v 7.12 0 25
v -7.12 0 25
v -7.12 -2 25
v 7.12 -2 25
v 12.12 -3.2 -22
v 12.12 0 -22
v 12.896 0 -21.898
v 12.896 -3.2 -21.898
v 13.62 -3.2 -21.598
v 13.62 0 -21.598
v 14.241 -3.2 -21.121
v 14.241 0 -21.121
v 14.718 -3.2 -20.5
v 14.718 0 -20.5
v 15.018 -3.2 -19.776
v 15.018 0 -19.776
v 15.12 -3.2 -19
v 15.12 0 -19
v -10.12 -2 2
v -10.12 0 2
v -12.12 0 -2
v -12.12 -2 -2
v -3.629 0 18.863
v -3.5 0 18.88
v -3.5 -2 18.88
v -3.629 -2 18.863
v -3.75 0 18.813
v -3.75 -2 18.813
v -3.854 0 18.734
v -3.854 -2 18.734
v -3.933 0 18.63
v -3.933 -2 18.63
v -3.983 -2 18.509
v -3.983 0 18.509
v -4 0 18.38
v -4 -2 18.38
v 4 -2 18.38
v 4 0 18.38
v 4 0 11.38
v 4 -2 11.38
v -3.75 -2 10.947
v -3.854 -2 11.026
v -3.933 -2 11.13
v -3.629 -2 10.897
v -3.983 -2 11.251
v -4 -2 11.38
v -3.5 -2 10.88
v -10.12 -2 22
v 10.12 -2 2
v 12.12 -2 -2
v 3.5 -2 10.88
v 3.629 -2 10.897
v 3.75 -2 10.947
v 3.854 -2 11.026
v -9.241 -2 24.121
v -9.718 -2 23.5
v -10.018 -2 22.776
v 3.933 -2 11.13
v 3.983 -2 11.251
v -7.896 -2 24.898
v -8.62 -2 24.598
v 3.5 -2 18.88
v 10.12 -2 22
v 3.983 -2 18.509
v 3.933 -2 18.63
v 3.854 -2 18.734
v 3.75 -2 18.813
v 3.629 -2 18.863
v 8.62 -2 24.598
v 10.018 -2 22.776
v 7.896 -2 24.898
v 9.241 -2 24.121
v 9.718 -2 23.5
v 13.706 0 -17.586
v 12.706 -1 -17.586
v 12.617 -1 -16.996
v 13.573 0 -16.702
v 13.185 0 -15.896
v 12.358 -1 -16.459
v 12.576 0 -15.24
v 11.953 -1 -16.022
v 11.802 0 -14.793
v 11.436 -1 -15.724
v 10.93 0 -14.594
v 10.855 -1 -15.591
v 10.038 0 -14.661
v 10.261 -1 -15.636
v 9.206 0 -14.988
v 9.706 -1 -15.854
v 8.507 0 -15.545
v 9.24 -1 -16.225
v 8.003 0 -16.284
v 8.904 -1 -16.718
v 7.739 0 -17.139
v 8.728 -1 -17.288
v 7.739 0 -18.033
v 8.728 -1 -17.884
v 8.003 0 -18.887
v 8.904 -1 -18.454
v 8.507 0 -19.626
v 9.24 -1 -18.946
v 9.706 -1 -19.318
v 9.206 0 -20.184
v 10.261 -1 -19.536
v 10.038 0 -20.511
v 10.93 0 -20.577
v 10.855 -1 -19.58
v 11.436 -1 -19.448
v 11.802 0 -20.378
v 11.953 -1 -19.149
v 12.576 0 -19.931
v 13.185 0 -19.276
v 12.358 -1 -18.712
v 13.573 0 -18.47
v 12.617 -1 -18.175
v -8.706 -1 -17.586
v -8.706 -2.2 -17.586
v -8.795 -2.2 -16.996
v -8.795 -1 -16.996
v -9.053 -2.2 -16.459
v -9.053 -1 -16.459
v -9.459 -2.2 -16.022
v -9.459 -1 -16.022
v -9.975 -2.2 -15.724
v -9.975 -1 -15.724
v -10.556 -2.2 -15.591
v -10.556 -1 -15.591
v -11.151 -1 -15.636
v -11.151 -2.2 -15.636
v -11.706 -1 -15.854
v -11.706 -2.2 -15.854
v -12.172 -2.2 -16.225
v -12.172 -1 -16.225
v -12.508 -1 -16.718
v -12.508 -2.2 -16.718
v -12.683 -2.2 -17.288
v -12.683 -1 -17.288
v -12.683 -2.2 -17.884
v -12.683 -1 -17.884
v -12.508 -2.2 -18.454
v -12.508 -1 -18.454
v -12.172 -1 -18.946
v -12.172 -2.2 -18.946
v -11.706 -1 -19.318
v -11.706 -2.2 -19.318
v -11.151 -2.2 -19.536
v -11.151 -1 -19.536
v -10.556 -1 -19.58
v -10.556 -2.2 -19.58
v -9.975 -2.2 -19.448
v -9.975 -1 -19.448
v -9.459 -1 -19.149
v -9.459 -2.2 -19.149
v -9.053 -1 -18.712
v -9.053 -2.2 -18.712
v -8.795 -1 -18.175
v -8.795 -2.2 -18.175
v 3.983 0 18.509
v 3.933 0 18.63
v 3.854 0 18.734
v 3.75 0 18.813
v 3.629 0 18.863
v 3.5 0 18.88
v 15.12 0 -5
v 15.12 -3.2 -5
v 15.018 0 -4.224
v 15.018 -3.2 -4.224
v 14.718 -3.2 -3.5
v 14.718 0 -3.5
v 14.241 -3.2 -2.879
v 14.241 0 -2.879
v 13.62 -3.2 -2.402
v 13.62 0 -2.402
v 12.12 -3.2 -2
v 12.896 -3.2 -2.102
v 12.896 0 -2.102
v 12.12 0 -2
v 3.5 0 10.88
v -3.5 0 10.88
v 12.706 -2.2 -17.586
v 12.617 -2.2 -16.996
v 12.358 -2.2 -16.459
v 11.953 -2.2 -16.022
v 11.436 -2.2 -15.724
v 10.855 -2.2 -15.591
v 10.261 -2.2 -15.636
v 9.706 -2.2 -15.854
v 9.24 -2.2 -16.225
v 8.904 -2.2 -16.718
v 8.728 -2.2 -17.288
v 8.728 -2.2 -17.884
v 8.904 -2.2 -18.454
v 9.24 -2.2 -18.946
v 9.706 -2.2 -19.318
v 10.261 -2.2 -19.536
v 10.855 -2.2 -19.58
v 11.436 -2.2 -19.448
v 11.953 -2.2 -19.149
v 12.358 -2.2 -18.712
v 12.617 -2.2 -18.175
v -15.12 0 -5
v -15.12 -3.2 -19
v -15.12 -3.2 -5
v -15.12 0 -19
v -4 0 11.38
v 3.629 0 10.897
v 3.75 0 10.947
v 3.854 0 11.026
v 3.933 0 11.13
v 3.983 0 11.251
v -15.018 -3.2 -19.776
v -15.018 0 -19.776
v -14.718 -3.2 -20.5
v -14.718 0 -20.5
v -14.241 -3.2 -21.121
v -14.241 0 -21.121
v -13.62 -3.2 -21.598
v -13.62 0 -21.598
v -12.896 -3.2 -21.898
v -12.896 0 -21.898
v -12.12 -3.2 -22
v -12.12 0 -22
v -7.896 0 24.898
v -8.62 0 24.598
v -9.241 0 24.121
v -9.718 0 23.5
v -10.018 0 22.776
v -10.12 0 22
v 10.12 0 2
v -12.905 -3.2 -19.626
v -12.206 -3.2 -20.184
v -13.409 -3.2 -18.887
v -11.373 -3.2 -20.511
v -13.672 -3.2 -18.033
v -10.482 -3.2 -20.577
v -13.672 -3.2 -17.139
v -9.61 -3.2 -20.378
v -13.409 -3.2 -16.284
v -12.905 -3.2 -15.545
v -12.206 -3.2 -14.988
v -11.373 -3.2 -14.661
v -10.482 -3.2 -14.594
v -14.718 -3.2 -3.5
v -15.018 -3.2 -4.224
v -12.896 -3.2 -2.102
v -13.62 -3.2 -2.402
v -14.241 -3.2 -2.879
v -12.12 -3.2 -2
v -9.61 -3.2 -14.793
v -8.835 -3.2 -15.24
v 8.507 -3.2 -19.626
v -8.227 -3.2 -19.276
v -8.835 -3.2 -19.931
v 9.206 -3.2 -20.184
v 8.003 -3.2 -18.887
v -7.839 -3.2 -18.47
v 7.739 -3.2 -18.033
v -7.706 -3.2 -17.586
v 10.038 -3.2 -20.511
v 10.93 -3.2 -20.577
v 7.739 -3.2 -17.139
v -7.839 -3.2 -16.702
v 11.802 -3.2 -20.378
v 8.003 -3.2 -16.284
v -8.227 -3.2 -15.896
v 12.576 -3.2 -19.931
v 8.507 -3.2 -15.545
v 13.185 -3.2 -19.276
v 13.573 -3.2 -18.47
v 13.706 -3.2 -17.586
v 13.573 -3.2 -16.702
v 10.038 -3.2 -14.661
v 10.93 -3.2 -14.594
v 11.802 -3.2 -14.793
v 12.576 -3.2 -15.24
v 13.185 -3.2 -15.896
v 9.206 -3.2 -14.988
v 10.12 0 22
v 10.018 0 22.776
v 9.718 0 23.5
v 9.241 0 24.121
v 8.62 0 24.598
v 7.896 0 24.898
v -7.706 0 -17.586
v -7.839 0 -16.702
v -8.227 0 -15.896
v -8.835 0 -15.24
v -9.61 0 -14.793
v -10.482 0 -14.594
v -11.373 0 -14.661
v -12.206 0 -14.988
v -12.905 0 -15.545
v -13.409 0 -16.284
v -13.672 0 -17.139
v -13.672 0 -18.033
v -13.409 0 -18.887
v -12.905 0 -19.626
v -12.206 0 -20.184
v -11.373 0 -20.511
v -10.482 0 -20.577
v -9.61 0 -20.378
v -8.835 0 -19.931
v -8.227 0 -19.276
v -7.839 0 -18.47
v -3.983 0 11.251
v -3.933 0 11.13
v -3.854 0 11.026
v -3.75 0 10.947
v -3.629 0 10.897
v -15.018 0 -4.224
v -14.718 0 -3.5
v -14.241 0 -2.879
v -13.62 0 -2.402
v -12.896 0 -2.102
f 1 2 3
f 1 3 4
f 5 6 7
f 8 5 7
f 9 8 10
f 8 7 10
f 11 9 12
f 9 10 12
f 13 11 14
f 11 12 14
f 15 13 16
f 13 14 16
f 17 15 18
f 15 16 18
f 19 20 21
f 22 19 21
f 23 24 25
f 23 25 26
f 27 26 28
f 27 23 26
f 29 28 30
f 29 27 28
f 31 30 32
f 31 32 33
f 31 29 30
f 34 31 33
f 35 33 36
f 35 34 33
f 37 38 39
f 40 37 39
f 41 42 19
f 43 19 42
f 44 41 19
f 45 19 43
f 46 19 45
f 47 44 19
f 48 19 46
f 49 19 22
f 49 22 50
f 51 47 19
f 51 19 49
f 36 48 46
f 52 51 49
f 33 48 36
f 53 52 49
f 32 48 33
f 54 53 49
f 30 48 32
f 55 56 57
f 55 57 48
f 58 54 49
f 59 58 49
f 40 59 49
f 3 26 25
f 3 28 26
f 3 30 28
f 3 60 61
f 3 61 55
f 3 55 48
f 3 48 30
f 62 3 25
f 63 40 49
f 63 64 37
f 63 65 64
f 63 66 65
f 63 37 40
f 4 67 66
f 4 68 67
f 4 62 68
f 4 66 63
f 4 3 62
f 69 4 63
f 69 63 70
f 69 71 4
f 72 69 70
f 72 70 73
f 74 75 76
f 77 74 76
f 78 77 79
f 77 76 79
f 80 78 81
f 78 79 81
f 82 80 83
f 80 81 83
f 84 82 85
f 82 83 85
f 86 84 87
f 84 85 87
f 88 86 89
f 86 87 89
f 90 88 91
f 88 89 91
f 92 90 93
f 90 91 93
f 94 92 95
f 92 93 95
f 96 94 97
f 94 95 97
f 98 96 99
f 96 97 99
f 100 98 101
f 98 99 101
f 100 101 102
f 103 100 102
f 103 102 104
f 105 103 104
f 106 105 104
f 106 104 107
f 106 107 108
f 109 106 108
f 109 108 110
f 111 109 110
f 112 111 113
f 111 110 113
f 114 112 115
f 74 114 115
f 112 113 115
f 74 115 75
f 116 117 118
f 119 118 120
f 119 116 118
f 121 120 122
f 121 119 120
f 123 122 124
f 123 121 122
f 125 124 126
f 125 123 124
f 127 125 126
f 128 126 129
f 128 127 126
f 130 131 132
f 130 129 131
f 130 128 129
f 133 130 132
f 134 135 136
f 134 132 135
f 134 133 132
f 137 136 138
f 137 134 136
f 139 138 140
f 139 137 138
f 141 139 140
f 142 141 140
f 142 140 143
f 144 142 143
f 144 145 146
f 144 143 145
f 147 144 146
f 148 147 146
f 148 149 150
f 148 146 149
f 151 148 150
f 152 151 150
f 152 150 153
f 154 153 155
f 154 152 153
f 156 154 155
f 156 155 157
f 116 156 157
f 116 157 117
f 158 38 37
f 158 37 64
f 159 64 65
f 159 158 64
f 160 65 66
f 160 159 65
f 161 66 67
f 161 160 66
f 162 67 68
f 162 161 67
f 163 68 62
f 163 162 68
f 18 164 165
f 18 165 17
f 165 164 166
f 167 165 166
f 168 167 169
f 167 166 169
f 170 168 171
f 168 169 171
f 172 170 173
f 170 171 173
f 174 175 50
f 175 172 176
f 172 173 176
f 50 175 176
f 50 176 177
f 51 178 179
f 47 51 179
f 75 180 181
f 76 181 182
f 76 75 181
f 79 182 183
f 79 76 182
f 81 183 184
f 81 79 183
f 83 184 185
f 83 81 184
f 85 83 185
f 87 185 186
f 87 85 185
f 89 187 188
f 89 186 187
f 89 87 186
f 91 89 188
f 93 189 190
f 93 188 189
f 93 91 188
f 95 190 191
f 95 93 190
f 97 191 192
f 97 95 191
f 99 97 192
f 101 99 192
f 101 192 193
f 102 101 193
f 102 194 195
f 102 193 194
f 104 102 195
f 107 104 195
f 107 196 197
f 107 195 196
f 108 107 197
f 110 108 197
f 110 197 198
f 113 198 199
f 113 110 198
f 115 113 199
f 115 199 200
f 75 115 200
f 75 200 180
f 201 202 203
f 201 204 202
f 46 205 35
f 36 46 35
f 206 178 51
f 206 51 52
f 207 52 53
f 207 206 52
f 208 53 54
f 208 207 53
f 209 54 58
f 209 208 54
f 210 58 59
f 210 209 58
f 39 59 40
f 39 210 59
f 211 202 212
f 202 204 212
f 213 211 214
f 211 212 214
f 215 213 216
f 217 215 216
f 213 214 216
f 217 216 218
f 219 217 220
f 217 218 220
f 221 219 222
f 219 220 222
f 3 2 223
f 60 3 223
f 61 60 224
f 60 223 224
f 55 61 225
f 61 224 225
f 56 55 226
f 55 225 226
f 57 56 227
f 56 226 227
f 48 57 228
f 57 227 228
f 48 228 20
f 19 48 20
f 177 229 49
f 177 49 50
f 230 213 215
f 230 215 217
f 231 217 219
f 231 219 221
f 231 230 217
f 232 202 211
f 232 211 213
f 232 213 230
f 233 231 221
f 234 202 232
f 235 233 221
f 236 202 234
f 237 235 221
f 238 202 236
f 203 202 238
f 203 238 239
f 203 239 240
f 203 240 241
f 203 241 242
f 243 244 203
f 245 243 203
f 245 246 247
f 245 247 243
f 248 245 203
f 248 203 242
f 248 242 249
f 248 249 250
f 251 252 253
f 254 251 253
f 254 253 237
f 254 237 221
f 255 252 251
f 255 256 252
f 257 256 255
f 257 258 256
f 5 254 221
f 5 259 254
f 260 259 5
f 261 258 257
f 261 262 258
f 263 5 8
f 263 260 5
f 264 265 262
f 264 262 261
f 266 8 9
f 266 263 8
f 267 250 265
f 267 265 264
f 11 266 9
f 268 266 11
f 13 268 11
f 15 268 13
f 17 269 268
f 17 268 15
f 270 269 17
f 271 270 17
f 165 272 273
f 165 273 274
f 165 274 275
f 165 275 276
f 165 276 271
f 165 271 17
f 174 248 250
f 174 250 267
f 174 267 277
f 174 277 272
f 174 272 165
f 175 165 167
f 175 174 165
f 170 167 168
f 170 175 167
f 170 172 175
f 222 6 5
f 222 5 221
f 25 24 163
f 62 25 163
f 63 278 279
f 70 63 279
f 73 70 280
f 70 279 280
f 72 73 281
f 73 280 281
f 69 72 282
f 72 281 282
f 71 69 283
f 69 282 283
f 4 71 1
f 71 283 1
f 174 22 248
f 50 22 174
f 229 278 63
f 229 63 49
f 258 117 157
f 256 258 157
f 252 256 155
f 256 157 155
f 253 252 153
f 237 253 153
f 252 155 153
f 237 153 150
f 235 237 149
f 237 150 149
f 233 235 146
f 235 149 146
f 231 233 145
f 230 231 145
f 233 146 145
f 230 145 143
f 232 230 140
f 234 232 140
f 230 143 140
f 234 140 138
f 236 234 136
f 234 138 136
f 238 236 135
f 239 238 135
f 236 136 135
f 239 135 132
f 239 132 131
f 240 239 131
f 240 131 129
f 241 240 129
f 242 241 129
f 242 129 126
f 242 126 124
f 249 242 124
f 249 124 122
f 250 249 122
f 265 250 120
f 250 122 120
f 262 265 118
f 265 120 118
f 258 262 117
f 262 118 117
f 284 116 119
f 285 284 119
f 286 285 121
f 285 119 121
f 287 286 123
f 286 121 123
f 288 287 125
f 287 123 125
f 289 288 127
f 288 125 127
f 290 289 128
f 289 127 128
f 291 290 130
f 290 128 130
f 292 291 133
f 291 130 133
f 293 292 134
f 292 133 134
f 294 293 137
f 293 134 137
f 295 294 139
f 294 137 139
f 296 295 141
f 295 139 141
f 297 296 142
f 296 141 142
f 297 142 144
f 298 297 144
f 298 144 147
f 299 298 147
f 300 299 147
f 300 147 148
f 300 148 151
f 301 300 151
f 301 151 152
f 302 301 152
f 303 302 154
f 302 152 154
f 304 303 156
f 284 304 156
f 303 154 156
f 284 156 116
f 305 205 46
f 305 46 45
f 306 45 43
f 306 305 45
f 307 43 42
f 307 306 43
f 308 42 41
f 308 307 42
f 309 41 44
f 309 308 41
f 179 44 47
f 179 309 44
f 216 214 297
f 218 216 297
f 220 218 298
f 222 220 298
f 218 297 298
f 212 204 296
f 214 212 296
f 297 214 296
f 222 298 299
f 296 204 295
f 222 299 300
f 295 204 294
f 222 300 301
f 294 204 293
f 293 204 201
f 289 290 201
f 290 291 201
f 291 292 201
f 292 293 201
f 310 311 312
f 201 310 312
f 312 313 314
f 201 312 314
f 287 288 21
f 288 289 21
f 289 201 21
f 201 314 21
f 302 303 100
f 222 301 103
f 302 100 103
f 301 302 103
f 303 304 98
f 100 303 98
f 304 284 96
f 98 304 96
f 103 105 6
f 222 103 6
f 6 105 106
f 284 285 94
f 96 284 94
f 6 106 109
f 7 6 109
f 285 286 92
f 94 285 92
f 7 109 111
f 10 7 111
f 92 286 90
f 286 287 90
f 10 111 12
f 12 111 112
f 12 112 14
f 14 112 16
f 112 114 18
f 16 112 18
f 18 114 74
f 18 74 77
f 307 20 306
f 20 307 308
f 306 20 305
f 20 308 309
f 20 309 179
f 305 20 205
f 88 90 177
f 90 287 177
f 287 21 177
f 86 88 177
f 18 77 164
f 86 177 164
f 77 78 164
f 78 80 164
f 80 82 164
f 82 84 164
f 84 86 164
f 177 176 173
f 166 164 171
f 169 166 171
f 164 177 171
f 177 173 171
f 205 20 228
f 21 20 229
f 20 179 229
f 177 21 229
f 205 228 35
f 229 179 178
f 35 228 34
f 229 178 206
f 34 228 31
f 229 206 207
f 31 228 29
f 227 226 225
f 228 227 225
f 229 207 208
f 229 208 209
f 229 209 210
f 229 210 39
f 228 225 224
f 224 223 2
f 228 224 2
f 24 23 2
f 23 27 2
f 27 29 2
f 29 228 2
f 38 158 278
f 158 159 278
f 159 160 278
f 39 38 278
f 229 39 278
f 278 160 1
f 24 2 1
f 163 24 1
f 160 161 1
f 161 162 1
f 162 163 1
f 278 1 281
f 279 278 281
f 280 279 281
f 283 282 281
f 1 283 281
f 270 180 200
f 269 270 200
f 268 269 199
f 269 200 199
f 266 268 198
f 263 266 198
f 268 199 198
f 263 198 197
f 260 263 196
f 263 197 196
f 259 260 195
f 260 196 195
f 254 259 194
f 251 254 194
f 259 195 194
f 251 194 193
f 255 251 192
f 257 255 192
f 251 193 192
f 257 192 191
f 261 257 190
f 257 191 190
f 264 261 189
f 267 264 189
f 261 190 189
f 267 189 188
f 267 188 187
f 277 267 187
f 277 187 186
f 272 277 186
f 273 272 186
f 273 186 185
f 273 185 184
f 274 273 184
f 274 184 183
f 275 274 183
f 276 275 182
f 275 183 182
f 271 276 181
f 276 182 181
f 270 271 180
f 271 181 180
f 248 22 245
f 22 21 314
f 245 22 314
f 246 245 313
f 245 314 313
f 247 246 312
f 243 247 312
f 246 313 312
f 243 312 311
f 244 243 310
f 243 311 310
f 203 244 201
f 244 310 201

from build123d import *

# Parameters (mm, degrees)
PAD013_DEPTH    = 2
PAD014_DEPTH    = 1.2
SKETCH061_R     = 2
POCKET010_DEPTH = 3.201
CHAMFER009_SIZE = 1


with BuildPart() as part:
    # Sketch034 → Pad013 (new body)
    with BuildSketch(Plane.XZ):
        with BuildLine():
            ThreePointArc((-7.12, 25), (-9.24132, 24.12132), (-10.12, 22))
            Line((-10.12, 22), (-10.12, 2))
            Line((-10.12, 2), (-12.12, -2))
            ThreePointArc((-12.12, -2), (-14.24132, -2.87868), (-15.12, -5))
            Line((-15.12, -5), (-15.12, -19))
            ThreePointArc((-15.12, -19), (-14.24132, -21.12132), (-12.12, -22))
            Line((-12.12, -22), (12.12, -22))
            ThreePointArc((12.12, -22), (14.24132, -21.12132), (15.12, -19))
            Line((15.12, -19), (15.12, -5))
            ThreePointArc((15.12, -5), (14.24132, -2.87868), (12.12, -2))
            Line((10.12, 2), (12.12, -2))
            Line((10.12, 22), (10.12, 2))
            ThreePointArc((10.12, 22), (9.24132, 24.12132), (7.12, 25))
            Line((-7.12, 25), (7.12, 25))
        make_face()
        with BuildLine():
            Line((-3.5, 18.88), (3.5, 18.88))
            ThreePointArc((4, 18.38), (3.853553, 18.733553), (3.5, 18.88))
            Line((4, 18.38), (4, 11.38))
            ThreePointArc((3.5, 10.88), (3.853553, 11.026447), (4, 11.38))
            Line((3.5, 10.88), (-3.5, 10.88))
            ThreePointArc((-4, 11.38), (-3.853553, 11.026447), (-3.5, 10.88))
            Line((-4, 11.38), (-4, 18.38))
            ThreePointArc((-3.5, 18.88), (-3.853553, 18.733553), (-4, 18.38))
        make_face(mode=Mode.SUBTRACT)
    extrude(amount=PAD013_DEPTH)

    # Sketch035 → Pad014 (join)
    with BuildSketch(Plane.XZ.offset(2)):
        with BuildLine():
            ThreePointArc((15.12, -5), (14.24132, -2.87868), (12.12, -2))
            Line((-12.12, -2), (12.12, -2))
            ThreePointArc((-12.12, -2), (-14.24132, -2.87868), (-15.12, -5))
            Line((-15.12, -19), (-15.12, -5))
            ThreePointArc((-15.12, -19), (-14.24132, -21.12132), (-12.12, -22))
            Line((12.12, -22), (-12.12, -22))
            ThreePointArc((12.12, -22), (14.24132, -21.12132), (15.12, -19))
            Line((15.12, -5), (15.12, -19))
        make_face()
    extrude(amount=PAD014_DEPTH)

    # Sketch061 → Pocket010 (cut, through all)
    with BuildSketch(Plane.XZ):
        with Locations((-10.705786, -17.585786)):
            Circle(SKETCH061_R)
        with Locations((10.705786, -17.585786)):
            Circle(SKETCH061_R)
    extrude(amount=POCKET010_DEPTH, mode=Mode.SUBTRACT)

    # Chamfer009
    chamfer009_edges = [part.edges().sort_by_distance(p)[0] for p in [
        (-12.705786, 0, -17.585786),
        (-8.705786, -1.6, -17.585786),
        (-12.705786, -3.2, -17.585786),
        (8.705786, 0, -17.585786),
        (12.705786, -1.6, -17.585786),
        (8.705786, -3.2, -17.585786),
    ]]
    chamfer(chamfer009_edges, length=CHAMFER009_SIZE)


solid = part.part
